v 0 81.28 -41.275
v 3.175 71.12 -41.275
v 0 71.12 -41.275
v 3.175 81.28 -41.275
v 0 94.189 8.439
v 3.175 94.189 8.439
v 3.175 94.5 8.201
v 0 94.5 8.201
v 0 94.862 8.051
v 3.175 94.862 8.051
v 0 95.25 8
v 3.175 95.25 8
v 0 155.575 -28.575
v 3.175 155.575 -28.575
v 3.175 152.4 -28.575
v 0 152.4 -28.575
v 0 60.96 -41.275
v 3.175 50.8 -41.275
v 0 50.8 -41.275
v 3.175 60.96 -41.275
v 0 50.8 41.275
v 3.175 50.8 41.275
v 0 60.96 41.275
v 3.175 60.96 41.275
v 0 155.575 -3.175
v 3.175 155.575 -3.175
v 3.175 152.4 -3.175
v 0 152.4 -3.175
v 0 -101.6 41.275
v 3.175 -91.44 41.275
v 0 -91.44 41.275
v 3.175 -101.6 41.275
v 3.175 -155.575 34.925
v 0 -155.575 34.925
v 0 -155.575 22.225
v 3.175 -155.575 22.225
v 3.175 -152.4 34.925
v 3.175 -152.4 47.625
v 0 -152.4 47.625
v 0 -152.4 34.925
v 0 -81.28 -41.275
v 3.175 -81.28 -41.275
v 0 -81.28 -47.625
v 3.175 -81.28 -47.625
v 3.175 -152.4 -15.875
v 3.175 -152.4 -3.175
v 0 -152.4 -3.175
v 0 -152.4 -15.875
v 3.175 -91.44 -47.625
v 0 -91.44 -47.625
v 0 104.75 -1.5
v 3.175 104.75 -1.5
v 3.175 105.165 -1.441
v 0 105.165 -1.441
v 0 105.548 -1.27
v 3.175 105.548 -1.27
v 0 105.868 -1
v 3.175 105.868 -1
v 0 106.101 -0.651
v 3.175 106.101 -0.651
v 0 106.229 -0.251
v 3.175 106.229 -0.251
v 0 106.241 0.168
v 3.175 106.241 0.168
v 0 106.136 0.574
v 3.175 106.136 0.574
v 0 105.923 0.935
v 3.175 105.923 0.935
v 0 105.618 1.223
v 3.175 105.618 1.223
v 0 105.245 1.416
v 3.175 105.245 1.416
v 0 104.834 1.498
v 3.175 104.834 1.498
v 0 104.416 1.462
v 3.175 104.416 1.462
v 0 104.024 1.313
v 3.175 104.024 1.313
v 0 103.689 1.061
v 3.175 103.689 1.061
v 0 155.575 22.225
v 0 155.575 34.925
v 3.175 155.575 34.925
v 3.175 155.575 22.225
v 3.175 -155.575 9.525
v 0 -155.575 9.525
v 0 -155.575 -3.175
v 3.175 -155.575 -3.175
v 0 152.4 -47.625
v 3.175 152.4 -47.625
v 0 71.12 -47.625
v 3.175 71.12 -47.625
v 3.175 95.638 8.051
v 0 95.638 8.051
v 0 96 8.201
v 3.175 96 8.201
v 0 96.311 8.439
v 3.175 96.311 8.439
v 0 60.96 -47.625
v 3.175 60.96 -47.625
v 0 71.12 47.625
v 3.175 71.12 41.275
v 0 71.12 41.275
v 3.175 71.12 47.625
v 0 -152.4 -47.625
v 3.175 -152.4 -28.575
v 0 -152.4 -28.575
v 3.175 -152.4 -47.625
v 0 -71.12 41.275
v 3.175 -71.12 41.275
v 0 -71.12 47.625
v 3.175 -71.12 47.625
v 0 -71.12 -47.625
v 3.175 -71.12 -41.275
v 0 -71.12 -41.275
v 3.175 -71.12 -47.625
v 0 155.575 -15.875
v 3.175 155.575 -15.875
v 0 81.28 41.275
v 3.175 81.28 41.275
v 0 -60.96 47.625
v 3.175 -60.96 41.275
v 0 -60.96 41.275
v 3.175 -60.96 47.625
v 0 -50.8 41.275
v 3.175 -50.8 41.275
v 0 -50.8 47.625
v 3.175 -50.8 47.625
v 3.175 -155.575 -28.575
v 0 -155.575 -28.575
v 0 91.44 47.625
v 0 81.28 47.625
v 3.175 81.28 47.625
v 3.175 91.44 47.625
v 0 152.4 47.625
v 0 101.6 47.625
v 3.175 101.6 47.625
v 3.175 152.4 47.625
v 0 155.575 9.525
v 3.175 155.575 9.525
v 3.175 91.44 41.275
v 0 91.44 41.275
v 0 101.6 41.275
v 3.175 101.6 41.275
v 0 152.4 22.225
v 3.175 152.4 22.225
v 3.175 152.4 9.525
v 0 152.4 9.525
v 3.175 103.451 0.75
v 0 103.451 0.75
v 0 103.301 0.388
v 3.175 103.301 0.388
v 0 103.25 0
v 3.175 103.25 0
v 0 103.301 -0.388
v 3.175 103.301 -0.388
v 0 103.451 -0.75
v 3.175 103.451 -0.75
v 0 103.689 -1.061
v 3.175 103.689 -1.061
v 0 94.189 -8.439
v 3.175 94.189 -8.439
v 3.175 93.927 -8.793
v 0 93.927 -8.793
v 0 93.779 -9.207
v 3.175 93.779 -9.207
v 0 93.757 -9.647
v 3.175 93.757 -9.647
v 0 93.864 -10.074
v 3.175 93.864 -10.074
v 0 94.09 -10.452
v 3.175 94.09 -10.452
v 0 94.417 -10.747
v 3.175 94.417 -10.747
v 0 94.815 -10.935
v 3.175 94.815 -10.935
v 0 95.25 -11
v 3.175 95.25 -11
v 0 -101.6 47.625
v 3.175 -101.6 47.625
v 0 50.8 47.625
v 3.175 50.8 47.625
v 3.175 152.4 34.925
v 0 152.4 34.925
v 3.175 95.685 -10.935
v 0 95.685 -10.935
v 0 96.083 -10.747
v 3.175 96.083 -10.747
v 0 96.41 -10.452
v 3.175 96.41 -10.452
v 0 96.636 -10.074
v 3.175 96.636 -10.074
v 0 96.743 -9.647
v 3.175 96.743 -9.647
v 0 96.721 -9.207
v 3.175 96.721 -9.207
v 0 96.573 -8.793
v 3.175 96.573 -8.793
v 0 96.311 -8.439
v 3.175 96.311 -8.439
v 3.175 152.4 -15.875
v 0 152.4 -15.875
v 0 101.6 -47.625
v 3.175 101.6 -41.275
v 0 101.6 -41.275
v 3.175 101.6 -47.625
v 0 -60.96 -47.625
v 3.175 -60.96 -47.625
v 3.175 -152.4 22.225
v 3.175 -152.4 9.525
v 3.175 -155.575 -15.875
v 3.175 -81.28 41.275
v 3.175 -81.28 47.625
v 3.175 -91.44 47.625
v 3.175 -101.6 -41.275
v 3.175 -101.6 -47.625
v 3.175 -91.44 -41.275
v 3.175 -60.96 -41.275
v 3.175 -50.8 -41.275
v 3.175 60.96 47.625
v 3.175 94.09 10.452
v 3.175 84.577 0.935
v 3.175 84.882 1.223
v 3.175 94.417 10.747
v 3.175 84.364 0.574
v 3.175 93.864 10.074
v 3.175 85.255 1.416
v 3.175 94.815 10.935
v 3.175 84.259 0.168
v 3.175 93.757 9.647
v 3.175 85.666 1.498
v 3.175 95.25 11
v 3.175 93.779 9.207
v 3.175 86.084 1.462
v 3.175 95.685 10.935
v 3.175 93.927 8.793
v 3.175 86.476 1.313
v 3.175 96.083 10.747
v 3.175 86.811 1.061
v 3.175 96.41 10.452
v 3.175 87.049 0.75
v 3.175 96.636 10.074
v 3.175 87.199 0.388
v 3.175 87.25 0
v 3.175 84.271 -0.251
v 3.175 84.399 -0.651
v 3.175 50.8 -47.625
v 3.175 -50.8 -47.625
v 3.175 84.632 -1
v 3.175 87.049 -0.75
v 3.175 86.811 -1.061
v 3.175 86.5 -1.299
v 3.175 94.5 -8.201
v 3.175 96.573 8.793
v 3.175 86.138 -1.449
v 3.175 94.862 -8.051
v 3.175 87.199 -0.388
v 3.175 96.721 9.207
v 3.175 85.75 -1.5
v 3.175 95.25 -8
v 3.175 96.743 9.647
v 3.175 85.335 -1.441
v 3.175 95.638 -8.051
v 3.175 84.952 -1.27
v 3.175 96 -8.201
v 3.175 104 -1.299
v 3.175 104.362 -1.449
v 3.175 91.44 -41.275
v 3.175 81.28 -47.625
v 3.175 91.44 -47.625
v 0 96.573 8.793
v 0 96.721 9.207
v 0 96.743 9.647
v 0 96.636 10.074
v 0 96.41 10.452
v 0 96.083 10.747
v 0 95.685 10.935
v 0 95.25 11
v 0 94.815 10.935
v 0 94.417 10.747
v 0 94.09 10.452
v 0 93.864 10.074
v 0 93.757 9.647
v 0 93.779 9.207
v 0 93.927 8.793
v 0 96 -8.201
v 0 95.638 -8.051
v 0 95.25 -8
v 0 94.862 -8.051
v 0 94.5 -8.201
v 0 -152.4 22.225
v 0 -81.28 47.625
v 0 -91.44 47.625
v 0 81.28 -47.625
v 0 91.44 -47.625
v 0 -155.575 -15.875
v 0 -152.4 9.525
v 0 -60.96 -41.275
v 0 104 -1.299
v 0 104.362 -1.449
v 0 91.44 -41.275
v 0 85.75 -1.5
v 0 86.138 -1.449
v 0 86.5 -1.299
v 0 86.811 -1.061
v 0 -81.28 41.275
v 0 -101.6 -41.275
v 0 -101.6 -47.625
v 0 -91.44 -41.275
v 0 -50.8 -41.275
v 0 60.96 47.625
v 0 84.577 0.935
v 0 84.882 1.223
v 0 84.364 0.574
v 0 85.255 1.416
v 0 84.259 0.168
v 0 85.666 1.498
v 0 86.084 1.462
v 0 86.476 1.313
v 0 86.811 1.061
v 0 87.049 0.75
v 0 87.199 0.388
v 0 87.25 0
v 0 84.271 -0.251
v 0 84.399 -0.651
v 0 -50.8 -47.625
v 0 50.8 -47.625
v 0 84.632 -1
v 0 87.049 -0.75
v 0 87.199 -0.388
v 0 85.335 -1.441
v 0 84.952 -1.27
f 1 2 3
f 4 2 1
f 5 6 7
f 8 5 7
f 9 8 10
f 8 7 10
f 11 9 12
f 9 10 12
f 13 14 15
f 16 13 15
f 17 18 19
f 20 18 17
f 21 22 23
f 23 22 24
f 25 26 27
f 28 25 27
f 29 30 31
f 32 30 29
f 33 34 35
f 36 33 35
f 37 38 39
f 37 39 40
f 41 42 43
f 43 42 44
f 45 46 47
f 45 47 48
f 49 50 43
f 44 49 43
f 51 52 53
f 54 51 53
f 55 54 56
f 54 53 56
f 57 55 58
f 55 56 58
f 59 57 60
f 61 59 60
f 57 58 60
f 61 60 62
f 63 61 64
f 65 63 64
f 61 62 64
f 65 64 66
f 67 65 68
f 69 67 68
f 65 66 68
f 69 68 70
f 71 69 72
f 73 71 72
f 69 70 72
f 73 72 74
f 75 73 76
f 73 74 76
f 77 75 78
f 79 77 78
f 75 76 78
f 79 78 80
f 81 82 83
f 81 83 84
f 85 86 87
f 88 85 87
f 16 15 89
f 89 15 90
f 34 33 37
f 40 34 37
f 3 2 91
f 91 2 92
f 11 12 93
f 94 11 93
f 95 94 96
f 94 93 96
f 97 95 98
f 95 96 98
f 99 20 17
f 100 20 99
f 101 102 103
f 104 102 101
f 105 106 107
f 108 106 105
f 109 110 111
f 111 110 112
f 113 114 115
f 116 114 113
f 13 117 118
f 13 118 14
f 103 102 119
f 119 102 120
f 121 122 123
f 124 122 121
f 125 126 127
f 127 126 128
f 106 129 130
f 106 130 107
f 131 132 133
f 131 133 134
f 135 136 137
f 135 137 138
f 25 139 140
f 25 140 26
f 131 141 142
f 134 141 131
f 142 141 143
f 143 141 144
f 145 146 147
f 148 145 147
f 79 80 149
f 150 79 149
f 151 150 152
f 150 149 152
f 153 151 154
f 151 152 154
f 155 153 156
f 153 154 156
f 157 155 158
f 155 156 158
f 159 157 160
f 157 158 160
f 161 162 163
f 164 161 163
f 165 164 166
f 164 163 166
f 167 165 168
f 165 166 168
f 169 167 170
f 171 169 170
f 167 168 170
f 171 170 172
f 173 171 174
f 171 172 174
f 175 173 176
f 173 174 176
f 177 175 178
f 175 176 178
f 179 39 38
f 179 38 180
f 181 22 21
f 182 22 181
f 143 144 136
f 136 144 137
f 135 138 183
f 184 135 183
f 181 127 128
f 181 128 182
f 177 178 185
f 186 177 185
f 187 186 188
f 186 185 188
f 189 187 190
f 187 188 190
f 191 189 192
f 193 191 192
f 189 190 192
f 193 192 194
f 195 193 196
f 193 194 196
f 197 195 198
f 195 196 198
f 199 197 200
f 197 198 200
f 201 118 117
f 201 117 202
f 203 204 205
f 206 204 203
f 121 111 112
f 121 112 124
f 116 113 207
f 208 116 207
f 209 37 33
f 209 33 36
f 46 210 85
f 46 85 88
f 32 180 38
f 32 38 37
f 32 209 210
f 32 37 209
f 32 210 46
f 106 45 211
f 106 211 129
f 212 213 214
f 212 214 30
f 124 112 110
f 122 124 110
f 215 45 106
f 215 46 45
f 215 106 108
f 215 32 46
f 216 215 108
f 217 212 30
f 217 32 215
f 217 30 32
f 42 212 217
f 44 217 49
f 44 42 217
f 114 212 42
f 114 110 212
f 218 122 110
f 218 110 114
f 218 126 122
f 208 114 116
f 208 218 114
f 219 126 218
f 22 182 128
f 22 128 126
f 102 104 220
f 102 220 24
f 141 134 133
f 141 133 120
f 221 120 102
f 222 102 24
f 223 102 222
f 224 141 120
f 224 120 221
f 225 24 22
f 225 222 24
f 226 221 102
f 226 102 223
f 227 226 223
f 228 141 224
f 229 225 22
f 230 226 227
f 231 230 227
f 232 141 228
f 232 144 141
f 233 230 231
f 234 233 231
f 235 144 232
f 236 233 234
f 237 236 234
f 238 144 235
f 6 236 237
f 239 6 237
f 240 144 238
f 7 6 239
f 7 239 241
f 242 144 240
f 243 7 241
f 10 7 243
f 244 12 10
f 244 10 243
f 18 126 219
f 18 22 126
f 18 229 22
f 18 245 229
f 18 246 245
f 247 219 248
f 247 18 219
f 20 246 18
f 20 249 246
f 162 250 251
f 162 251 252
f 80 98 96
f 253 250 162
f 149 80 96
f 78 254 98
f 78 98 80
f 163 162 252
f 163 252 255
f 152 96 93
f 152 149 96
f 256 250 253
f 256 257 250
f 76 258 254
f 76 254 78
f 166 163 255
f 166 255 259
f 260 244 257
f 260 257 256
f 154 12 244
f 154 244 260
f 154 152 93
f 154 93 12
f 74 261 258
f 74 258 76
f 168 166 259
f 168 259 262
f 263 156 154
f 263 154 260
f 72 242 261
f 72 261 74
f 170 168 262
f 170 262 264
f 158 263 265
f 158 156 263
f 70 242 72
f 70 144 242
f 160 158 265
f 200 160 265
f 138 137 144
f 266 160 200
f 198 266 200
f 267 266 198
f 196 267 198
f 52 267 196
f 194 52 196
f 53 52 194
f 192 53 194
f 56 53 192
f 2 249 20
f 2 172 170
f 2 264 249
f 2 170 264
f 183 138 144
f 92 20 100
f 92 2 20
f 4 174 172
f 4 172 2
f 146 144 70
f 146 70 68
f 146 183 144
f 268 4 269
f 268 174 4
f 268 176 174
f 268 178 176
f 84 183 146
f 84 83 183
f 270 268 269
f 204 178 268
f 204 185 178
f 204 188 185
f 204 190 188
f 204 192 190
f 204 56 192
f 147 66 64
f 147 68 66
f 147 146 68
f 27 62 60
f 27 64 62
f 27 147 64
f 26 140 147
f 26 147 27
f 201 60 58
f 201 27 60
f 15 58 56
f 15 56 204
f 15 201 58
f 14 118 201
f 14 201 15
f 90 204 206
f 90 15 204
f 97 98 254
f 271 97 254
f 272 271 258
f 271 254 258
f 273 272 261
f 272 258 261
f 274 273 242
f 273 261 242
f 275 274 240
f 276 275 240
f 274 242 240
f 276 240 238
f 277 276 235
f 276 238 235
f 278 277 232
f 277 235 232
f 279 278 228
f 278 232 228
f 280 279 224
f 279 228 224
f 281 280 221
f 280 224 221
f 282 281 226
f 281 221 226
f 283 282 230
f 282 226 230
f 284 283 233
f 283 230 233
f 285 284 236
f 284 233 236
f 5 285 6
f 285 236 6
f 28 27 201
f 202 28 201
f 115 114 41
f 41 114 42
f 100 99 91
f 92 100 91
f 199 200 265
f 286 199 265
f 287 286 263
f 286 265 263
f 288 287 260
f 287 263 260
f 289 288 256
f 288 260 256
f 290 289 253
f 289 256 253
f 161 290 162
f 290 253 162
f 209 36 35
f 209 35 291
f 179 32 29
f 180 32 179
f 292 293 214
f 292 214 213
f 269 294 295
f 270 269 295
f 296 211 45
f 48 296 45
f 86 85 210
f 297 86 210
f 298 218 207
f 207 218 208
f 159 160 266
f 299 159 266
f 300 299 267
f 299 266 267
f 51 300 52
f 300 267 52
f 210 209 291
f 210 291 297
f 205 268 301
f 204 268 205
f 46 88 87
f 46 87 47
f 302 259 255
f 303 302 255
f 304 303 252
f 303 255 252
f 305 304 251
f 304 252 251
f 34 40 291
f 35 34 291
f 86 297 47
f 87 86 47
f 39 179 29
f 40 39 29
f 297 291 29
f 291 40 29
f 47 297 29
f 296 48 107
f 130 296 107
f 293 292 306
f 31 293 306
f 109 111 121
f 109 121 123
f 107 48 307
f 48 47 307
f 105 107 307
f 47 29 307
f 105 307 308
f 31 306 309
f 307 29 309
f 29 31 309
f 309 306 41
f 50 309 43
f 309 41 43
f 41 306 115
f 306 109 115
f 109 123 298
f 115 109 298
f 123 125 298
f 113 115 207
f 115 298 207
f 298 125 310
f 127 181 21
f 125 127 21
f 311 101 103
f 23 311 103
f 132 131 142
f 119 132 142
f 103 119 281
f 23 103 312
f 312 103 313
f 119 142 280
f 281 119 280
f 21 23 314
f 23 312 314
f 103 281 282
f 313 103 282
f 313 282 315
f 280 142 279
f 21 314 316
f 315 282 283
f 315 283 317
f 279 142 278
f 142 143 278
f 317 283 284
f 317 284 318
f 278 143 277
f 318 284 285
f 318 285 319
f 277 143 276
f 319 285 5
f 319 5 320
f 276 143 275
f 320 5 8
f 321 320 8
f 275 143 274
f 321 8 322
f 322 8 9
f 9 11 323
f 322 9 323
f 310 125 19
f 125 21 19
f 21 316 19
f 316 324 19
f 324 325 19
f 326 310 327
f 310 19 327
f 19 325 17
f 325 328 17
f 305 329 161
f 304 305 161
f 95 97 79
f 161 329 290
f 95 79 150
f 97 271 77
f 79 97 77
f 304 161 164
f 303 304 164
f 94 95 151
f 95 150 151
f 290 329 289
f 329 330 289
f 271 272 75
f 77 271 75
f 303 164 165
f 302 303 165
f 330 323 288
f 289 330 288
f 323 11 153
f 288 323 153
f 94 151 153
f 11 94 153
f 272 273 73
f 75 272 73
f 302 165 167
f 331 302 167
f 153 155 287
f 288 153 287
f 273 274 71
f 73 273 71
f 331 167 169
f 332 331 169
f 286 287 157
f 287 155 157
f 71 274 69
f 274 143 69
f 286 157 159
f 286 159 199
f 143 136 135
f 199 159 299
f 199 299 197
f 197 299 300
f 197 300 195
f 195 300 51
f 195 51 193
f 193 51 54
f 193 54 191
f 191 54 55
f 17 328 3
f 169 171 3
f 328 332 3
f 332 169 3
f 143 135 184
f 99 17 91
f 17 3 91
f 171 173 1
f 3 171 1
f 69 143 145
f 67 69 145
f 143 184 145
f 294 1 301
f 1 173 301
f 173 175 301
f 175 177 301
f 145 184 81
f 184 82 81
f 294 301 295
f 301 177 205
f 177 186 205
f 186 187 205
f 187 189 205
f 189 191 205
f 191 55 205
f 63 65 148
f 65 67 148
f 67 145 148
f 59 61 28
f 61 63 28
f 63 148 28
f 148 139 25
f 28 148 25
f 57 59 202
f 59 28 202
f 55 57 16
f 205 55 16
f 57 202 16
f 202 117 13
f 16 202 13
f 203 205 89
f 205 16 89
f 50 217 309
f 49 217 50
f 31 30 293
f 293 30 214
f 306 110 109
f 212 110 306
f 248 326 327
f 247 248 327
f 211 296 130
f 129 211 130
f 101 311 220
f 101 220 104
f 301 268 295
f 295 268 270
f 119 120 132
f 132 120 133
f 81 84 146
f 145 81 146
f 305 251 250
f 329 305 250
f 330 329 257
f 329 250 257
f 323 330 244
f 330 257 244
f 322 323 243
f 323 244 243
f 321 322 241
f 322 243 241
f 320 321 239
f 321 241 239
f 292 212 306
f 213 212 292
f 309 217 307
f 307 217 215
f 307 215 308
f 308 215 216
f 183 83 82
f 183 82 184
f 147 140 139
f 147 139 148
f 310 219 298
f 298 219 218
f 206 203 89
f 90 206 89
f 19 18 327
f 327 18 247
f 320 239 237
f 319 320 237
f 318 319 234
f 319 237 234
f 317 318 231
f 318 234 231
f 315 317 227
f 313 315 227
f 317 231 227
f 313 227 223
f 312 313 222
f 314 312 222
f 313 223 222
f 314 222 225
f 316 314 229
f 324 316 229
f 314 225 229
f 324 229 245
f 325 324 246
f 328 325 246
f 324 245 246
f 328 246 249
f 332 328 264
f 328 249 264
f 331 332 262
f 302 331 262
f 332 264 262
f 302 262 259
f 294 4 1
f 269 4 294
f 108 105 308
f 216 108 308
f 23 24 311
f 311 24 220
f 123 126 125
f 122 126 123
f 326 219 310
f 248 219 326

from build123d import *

# Parameters (mm, degrees)
SKETCH1_W               = 95.25
SKETCH1_H               = 311.15
BOSS_EXTRUDE1_DEPTH     = 3.175
SKETCH2_W               = 12.7
SKETCH2_H               = 3.175
SKETCH2_W_2             = 19.05
CUT_EXTRUDE1_DEPTH      = 3.175
SKETCH3_W               = 6.35
SKETCH3_H               = 10.16
CUT_EXTRUDE2_DEPTH      = 3.175
MIRROR3_COPY_1_SKETCH_W = 6.35
MIRROR3_COPY_1_SKETCH_H = 10.16
MIRROR3_COPY_1_DEPTH    = 3.175
CUT_EXTRUDE3_DEPTH      = 3.175


with BuildPart() as part:
    # Sketch1 → Boss-Extrude1 (new body)
    with BuildSketch(Plane(origin=(0, 0, 0), x_dir=(0, 0, -1), z_dir=(1, 0, 0))):
        Rectangle(SKETCH1_W, SKETCH1_H)
    extrude(amount=BOSS_EXTRUDE1_DEPTH)

    # Sketch2 → Cut-Extrude1 (cut)
    with BuildSketch(Plane(origin=(3.175, 0, 0), x_dir=(0, 0, -1), z_dir=(1, 0, 0))):
        with Locations((9.525, -153.9875)):
            Rectangle(SKETCH2_W, SKETCH2_H)
        with Locations((-15.875, -153.9875)):
            Rectangle(SKETCH2_W, SKETCH2_H)
        with Locations((-41.275, -153.9875)):
            Rectangle(SKETCH2_W, SKETCH2_H)
        with Locations((38.1, -153.9875)):
            Rectangle(SKETCH2_W_2, SKETCH2_H)
    cut_extrude1 = extrude(amount=-CUT_EXTRUDE1_DEPTH, mode=Mode.SUBTRACT)

    # Mirror1: Cut-Extrude1 across plane
    add(cut_extrude1.mirror(Plane.ZX), mode=Mode.SUBTRACT)

    # Sketch3 → Cut-Extrude2 (cut)
    with BuildSketch(Plane(origin=(3.175, 0, 0), x_dir=(0, 0, -1), z_dir=(1, 0, 0))):
        with Locations((44.45, 96.52)):
            Rectangle(SKETCH3_W, SKETCH3_H)
        with Locations((44.45, 76.2)):
            Rectangle(SKETCH3_W, SKETCH3_H)
        with Locations((44.45, 55.88)):
            Rectangle(SKETCH3_W, SKETCH3_H)
    cut_extrude2 = extrude(amount=-CUT_EXTRUDE2_DEPTH, mode=Mode.SUBTRACT)

    # Mirror2: Cut-Extrude2 across plane
    add(cut_extrude2.mirror(Plane.XY), mode=Mode.SUBTRACT)

    # Mirror3: Cut-Extrude2 across plane
    add(cut_extrude2.mirror(Plane.ZX), mode=Mode.SUBTRACT)

    # Mirror3 copy 1 sketch → Mirror3 copy 1 (cut)
    with BuildSketch(Plane(origin=(3.175, 0, 0), x_dir=(0, 0, 1), z_dir=(1, 0, 0))):
        with Locations((44.45, 96.52)):
            Rectangle(MIRROR3_COPY_1_SKETCH_W, MIRROR3_COPY_1_SKETCH_H)
        with Locations((44.45, 76.2)):
            Rectangle(MIRROR3_COPY_1_SKETCH_W, MIRROR3_COPY_1_SKETCH_H)
        with Locations((44.45, 55.88)):
            Rectangle(MIRROR3_COPY_1_SKETCH_W, MIRROR3_COPY_1_SKETCH_H)
    extrude(amount=-MIRROR3_COPY_1_DEPTH, mode=Mode.SUBTRACT)

    # Sketch5 → Cut-Extrude3 (cut)
    with BuildSketch(Plane(origin=(3.175, 0, 0), x_dir=(0, 0, -1), z_dir=(1, 0, 0))):
        with BuildLine():
            Line((1.060660172, 103.689339828), (0, 104.75))
            Line((0, 104.75), (-1.060660172, 103.689339828))
            ThreePointArc((-1.060660172, 103.689339828), (0, 103.25), (1.060660172, 103.689339828))
        make_face()
        with BuildLine():
            Line((-1.060660172, 103.689339828), (0, 104.75))
            Line((0, 104.75), (1.060660172, 103.689339828))
            ThreePointArc((1.060660172, 103.689339828), (1.385819299, 104.175974851), (1.5, 104.75))
            ThreePointArc((1.5, 104.75), (-0.574025149, 106.135819299), (-1.060660172, 103.689339828))
        make_face()
        with BuildLine():
            ThreePointArc((11, 95.25), (10.074025149, 96.635819299), (8.439339828, 96.310660172))
            Line((8.439339828, 96.310660172), (9.5, 95.25))
            Line((9.5, 95.25), (8.439339828, 94.189339828))
            ThreePointArc((8.439339828, 94.189339828), (10.074025149, 93.864180701), (11, 95.25))
        make_face()
        with BuildLine():
            Line((9.5, 95.25), (8.439339828, 96.310660172))
            ThreePointArc((8.439339828, 96.310660172), (8, 95.25), (8.439339828, 94.189339828))
            Line((8.439339828, 94.189339828), (9.5, 95.25))
        make_face()
        with BuildLine():
            ThreePointArc((-8, 95.25), (-8.114180701, 95.824025149), (-8.439339828, 96.310660172))
            Line((-8.439339828, 96.310660172), (-9.5, 95.25))
            Line((-9.5, 95.25), (-8.439339828, 94.189339828))
            ThreePointArc((-8.439339828, 94.189339828), (-8.114180701, 94.675974851), (-8, 95.25))
        make_face()
        with BuildLine():
            Line((-9.5, 95.25), (-8.439339828, 96.310660172))
            ThreePointArc((-8.439339828, 96.310660172), (-11, 95.25), (-8.439339828, 94.189339828))
            Line((-8.439339828, 94.189339828), (-9.5, 95.25))
        make_face()
        with BuildLine():
            ThreePointArc((1.060660172, 86.810660172), (0, 87.25), (-1.060660172, 86.810660172))
            Line((-1.060660172, 86.810660172), (0, 85.75))
            Line((0, 85.75), (1.060660172, 86.810660172))
        make_face()
        with BuildLine():
            Line((0, 85.75), (-1.060660172, 86.810660172))
            ThreePointArc((-1.060660172, 86.810660172), (-0.574025149, 84.364180701), (1.5, 85.75))
            ThreePointArc((1.5, 85.75), (1.385819299, 86.324025149), (1.060660172, 86.810660172))
            Line((1.060660172, 86.810660172), (0, 85.75))
        make_face()
    extrude(amount=-CUT_EXTRUDE3_DEPTH, mode=Mode.SUBTRACT)


solid = part.part
